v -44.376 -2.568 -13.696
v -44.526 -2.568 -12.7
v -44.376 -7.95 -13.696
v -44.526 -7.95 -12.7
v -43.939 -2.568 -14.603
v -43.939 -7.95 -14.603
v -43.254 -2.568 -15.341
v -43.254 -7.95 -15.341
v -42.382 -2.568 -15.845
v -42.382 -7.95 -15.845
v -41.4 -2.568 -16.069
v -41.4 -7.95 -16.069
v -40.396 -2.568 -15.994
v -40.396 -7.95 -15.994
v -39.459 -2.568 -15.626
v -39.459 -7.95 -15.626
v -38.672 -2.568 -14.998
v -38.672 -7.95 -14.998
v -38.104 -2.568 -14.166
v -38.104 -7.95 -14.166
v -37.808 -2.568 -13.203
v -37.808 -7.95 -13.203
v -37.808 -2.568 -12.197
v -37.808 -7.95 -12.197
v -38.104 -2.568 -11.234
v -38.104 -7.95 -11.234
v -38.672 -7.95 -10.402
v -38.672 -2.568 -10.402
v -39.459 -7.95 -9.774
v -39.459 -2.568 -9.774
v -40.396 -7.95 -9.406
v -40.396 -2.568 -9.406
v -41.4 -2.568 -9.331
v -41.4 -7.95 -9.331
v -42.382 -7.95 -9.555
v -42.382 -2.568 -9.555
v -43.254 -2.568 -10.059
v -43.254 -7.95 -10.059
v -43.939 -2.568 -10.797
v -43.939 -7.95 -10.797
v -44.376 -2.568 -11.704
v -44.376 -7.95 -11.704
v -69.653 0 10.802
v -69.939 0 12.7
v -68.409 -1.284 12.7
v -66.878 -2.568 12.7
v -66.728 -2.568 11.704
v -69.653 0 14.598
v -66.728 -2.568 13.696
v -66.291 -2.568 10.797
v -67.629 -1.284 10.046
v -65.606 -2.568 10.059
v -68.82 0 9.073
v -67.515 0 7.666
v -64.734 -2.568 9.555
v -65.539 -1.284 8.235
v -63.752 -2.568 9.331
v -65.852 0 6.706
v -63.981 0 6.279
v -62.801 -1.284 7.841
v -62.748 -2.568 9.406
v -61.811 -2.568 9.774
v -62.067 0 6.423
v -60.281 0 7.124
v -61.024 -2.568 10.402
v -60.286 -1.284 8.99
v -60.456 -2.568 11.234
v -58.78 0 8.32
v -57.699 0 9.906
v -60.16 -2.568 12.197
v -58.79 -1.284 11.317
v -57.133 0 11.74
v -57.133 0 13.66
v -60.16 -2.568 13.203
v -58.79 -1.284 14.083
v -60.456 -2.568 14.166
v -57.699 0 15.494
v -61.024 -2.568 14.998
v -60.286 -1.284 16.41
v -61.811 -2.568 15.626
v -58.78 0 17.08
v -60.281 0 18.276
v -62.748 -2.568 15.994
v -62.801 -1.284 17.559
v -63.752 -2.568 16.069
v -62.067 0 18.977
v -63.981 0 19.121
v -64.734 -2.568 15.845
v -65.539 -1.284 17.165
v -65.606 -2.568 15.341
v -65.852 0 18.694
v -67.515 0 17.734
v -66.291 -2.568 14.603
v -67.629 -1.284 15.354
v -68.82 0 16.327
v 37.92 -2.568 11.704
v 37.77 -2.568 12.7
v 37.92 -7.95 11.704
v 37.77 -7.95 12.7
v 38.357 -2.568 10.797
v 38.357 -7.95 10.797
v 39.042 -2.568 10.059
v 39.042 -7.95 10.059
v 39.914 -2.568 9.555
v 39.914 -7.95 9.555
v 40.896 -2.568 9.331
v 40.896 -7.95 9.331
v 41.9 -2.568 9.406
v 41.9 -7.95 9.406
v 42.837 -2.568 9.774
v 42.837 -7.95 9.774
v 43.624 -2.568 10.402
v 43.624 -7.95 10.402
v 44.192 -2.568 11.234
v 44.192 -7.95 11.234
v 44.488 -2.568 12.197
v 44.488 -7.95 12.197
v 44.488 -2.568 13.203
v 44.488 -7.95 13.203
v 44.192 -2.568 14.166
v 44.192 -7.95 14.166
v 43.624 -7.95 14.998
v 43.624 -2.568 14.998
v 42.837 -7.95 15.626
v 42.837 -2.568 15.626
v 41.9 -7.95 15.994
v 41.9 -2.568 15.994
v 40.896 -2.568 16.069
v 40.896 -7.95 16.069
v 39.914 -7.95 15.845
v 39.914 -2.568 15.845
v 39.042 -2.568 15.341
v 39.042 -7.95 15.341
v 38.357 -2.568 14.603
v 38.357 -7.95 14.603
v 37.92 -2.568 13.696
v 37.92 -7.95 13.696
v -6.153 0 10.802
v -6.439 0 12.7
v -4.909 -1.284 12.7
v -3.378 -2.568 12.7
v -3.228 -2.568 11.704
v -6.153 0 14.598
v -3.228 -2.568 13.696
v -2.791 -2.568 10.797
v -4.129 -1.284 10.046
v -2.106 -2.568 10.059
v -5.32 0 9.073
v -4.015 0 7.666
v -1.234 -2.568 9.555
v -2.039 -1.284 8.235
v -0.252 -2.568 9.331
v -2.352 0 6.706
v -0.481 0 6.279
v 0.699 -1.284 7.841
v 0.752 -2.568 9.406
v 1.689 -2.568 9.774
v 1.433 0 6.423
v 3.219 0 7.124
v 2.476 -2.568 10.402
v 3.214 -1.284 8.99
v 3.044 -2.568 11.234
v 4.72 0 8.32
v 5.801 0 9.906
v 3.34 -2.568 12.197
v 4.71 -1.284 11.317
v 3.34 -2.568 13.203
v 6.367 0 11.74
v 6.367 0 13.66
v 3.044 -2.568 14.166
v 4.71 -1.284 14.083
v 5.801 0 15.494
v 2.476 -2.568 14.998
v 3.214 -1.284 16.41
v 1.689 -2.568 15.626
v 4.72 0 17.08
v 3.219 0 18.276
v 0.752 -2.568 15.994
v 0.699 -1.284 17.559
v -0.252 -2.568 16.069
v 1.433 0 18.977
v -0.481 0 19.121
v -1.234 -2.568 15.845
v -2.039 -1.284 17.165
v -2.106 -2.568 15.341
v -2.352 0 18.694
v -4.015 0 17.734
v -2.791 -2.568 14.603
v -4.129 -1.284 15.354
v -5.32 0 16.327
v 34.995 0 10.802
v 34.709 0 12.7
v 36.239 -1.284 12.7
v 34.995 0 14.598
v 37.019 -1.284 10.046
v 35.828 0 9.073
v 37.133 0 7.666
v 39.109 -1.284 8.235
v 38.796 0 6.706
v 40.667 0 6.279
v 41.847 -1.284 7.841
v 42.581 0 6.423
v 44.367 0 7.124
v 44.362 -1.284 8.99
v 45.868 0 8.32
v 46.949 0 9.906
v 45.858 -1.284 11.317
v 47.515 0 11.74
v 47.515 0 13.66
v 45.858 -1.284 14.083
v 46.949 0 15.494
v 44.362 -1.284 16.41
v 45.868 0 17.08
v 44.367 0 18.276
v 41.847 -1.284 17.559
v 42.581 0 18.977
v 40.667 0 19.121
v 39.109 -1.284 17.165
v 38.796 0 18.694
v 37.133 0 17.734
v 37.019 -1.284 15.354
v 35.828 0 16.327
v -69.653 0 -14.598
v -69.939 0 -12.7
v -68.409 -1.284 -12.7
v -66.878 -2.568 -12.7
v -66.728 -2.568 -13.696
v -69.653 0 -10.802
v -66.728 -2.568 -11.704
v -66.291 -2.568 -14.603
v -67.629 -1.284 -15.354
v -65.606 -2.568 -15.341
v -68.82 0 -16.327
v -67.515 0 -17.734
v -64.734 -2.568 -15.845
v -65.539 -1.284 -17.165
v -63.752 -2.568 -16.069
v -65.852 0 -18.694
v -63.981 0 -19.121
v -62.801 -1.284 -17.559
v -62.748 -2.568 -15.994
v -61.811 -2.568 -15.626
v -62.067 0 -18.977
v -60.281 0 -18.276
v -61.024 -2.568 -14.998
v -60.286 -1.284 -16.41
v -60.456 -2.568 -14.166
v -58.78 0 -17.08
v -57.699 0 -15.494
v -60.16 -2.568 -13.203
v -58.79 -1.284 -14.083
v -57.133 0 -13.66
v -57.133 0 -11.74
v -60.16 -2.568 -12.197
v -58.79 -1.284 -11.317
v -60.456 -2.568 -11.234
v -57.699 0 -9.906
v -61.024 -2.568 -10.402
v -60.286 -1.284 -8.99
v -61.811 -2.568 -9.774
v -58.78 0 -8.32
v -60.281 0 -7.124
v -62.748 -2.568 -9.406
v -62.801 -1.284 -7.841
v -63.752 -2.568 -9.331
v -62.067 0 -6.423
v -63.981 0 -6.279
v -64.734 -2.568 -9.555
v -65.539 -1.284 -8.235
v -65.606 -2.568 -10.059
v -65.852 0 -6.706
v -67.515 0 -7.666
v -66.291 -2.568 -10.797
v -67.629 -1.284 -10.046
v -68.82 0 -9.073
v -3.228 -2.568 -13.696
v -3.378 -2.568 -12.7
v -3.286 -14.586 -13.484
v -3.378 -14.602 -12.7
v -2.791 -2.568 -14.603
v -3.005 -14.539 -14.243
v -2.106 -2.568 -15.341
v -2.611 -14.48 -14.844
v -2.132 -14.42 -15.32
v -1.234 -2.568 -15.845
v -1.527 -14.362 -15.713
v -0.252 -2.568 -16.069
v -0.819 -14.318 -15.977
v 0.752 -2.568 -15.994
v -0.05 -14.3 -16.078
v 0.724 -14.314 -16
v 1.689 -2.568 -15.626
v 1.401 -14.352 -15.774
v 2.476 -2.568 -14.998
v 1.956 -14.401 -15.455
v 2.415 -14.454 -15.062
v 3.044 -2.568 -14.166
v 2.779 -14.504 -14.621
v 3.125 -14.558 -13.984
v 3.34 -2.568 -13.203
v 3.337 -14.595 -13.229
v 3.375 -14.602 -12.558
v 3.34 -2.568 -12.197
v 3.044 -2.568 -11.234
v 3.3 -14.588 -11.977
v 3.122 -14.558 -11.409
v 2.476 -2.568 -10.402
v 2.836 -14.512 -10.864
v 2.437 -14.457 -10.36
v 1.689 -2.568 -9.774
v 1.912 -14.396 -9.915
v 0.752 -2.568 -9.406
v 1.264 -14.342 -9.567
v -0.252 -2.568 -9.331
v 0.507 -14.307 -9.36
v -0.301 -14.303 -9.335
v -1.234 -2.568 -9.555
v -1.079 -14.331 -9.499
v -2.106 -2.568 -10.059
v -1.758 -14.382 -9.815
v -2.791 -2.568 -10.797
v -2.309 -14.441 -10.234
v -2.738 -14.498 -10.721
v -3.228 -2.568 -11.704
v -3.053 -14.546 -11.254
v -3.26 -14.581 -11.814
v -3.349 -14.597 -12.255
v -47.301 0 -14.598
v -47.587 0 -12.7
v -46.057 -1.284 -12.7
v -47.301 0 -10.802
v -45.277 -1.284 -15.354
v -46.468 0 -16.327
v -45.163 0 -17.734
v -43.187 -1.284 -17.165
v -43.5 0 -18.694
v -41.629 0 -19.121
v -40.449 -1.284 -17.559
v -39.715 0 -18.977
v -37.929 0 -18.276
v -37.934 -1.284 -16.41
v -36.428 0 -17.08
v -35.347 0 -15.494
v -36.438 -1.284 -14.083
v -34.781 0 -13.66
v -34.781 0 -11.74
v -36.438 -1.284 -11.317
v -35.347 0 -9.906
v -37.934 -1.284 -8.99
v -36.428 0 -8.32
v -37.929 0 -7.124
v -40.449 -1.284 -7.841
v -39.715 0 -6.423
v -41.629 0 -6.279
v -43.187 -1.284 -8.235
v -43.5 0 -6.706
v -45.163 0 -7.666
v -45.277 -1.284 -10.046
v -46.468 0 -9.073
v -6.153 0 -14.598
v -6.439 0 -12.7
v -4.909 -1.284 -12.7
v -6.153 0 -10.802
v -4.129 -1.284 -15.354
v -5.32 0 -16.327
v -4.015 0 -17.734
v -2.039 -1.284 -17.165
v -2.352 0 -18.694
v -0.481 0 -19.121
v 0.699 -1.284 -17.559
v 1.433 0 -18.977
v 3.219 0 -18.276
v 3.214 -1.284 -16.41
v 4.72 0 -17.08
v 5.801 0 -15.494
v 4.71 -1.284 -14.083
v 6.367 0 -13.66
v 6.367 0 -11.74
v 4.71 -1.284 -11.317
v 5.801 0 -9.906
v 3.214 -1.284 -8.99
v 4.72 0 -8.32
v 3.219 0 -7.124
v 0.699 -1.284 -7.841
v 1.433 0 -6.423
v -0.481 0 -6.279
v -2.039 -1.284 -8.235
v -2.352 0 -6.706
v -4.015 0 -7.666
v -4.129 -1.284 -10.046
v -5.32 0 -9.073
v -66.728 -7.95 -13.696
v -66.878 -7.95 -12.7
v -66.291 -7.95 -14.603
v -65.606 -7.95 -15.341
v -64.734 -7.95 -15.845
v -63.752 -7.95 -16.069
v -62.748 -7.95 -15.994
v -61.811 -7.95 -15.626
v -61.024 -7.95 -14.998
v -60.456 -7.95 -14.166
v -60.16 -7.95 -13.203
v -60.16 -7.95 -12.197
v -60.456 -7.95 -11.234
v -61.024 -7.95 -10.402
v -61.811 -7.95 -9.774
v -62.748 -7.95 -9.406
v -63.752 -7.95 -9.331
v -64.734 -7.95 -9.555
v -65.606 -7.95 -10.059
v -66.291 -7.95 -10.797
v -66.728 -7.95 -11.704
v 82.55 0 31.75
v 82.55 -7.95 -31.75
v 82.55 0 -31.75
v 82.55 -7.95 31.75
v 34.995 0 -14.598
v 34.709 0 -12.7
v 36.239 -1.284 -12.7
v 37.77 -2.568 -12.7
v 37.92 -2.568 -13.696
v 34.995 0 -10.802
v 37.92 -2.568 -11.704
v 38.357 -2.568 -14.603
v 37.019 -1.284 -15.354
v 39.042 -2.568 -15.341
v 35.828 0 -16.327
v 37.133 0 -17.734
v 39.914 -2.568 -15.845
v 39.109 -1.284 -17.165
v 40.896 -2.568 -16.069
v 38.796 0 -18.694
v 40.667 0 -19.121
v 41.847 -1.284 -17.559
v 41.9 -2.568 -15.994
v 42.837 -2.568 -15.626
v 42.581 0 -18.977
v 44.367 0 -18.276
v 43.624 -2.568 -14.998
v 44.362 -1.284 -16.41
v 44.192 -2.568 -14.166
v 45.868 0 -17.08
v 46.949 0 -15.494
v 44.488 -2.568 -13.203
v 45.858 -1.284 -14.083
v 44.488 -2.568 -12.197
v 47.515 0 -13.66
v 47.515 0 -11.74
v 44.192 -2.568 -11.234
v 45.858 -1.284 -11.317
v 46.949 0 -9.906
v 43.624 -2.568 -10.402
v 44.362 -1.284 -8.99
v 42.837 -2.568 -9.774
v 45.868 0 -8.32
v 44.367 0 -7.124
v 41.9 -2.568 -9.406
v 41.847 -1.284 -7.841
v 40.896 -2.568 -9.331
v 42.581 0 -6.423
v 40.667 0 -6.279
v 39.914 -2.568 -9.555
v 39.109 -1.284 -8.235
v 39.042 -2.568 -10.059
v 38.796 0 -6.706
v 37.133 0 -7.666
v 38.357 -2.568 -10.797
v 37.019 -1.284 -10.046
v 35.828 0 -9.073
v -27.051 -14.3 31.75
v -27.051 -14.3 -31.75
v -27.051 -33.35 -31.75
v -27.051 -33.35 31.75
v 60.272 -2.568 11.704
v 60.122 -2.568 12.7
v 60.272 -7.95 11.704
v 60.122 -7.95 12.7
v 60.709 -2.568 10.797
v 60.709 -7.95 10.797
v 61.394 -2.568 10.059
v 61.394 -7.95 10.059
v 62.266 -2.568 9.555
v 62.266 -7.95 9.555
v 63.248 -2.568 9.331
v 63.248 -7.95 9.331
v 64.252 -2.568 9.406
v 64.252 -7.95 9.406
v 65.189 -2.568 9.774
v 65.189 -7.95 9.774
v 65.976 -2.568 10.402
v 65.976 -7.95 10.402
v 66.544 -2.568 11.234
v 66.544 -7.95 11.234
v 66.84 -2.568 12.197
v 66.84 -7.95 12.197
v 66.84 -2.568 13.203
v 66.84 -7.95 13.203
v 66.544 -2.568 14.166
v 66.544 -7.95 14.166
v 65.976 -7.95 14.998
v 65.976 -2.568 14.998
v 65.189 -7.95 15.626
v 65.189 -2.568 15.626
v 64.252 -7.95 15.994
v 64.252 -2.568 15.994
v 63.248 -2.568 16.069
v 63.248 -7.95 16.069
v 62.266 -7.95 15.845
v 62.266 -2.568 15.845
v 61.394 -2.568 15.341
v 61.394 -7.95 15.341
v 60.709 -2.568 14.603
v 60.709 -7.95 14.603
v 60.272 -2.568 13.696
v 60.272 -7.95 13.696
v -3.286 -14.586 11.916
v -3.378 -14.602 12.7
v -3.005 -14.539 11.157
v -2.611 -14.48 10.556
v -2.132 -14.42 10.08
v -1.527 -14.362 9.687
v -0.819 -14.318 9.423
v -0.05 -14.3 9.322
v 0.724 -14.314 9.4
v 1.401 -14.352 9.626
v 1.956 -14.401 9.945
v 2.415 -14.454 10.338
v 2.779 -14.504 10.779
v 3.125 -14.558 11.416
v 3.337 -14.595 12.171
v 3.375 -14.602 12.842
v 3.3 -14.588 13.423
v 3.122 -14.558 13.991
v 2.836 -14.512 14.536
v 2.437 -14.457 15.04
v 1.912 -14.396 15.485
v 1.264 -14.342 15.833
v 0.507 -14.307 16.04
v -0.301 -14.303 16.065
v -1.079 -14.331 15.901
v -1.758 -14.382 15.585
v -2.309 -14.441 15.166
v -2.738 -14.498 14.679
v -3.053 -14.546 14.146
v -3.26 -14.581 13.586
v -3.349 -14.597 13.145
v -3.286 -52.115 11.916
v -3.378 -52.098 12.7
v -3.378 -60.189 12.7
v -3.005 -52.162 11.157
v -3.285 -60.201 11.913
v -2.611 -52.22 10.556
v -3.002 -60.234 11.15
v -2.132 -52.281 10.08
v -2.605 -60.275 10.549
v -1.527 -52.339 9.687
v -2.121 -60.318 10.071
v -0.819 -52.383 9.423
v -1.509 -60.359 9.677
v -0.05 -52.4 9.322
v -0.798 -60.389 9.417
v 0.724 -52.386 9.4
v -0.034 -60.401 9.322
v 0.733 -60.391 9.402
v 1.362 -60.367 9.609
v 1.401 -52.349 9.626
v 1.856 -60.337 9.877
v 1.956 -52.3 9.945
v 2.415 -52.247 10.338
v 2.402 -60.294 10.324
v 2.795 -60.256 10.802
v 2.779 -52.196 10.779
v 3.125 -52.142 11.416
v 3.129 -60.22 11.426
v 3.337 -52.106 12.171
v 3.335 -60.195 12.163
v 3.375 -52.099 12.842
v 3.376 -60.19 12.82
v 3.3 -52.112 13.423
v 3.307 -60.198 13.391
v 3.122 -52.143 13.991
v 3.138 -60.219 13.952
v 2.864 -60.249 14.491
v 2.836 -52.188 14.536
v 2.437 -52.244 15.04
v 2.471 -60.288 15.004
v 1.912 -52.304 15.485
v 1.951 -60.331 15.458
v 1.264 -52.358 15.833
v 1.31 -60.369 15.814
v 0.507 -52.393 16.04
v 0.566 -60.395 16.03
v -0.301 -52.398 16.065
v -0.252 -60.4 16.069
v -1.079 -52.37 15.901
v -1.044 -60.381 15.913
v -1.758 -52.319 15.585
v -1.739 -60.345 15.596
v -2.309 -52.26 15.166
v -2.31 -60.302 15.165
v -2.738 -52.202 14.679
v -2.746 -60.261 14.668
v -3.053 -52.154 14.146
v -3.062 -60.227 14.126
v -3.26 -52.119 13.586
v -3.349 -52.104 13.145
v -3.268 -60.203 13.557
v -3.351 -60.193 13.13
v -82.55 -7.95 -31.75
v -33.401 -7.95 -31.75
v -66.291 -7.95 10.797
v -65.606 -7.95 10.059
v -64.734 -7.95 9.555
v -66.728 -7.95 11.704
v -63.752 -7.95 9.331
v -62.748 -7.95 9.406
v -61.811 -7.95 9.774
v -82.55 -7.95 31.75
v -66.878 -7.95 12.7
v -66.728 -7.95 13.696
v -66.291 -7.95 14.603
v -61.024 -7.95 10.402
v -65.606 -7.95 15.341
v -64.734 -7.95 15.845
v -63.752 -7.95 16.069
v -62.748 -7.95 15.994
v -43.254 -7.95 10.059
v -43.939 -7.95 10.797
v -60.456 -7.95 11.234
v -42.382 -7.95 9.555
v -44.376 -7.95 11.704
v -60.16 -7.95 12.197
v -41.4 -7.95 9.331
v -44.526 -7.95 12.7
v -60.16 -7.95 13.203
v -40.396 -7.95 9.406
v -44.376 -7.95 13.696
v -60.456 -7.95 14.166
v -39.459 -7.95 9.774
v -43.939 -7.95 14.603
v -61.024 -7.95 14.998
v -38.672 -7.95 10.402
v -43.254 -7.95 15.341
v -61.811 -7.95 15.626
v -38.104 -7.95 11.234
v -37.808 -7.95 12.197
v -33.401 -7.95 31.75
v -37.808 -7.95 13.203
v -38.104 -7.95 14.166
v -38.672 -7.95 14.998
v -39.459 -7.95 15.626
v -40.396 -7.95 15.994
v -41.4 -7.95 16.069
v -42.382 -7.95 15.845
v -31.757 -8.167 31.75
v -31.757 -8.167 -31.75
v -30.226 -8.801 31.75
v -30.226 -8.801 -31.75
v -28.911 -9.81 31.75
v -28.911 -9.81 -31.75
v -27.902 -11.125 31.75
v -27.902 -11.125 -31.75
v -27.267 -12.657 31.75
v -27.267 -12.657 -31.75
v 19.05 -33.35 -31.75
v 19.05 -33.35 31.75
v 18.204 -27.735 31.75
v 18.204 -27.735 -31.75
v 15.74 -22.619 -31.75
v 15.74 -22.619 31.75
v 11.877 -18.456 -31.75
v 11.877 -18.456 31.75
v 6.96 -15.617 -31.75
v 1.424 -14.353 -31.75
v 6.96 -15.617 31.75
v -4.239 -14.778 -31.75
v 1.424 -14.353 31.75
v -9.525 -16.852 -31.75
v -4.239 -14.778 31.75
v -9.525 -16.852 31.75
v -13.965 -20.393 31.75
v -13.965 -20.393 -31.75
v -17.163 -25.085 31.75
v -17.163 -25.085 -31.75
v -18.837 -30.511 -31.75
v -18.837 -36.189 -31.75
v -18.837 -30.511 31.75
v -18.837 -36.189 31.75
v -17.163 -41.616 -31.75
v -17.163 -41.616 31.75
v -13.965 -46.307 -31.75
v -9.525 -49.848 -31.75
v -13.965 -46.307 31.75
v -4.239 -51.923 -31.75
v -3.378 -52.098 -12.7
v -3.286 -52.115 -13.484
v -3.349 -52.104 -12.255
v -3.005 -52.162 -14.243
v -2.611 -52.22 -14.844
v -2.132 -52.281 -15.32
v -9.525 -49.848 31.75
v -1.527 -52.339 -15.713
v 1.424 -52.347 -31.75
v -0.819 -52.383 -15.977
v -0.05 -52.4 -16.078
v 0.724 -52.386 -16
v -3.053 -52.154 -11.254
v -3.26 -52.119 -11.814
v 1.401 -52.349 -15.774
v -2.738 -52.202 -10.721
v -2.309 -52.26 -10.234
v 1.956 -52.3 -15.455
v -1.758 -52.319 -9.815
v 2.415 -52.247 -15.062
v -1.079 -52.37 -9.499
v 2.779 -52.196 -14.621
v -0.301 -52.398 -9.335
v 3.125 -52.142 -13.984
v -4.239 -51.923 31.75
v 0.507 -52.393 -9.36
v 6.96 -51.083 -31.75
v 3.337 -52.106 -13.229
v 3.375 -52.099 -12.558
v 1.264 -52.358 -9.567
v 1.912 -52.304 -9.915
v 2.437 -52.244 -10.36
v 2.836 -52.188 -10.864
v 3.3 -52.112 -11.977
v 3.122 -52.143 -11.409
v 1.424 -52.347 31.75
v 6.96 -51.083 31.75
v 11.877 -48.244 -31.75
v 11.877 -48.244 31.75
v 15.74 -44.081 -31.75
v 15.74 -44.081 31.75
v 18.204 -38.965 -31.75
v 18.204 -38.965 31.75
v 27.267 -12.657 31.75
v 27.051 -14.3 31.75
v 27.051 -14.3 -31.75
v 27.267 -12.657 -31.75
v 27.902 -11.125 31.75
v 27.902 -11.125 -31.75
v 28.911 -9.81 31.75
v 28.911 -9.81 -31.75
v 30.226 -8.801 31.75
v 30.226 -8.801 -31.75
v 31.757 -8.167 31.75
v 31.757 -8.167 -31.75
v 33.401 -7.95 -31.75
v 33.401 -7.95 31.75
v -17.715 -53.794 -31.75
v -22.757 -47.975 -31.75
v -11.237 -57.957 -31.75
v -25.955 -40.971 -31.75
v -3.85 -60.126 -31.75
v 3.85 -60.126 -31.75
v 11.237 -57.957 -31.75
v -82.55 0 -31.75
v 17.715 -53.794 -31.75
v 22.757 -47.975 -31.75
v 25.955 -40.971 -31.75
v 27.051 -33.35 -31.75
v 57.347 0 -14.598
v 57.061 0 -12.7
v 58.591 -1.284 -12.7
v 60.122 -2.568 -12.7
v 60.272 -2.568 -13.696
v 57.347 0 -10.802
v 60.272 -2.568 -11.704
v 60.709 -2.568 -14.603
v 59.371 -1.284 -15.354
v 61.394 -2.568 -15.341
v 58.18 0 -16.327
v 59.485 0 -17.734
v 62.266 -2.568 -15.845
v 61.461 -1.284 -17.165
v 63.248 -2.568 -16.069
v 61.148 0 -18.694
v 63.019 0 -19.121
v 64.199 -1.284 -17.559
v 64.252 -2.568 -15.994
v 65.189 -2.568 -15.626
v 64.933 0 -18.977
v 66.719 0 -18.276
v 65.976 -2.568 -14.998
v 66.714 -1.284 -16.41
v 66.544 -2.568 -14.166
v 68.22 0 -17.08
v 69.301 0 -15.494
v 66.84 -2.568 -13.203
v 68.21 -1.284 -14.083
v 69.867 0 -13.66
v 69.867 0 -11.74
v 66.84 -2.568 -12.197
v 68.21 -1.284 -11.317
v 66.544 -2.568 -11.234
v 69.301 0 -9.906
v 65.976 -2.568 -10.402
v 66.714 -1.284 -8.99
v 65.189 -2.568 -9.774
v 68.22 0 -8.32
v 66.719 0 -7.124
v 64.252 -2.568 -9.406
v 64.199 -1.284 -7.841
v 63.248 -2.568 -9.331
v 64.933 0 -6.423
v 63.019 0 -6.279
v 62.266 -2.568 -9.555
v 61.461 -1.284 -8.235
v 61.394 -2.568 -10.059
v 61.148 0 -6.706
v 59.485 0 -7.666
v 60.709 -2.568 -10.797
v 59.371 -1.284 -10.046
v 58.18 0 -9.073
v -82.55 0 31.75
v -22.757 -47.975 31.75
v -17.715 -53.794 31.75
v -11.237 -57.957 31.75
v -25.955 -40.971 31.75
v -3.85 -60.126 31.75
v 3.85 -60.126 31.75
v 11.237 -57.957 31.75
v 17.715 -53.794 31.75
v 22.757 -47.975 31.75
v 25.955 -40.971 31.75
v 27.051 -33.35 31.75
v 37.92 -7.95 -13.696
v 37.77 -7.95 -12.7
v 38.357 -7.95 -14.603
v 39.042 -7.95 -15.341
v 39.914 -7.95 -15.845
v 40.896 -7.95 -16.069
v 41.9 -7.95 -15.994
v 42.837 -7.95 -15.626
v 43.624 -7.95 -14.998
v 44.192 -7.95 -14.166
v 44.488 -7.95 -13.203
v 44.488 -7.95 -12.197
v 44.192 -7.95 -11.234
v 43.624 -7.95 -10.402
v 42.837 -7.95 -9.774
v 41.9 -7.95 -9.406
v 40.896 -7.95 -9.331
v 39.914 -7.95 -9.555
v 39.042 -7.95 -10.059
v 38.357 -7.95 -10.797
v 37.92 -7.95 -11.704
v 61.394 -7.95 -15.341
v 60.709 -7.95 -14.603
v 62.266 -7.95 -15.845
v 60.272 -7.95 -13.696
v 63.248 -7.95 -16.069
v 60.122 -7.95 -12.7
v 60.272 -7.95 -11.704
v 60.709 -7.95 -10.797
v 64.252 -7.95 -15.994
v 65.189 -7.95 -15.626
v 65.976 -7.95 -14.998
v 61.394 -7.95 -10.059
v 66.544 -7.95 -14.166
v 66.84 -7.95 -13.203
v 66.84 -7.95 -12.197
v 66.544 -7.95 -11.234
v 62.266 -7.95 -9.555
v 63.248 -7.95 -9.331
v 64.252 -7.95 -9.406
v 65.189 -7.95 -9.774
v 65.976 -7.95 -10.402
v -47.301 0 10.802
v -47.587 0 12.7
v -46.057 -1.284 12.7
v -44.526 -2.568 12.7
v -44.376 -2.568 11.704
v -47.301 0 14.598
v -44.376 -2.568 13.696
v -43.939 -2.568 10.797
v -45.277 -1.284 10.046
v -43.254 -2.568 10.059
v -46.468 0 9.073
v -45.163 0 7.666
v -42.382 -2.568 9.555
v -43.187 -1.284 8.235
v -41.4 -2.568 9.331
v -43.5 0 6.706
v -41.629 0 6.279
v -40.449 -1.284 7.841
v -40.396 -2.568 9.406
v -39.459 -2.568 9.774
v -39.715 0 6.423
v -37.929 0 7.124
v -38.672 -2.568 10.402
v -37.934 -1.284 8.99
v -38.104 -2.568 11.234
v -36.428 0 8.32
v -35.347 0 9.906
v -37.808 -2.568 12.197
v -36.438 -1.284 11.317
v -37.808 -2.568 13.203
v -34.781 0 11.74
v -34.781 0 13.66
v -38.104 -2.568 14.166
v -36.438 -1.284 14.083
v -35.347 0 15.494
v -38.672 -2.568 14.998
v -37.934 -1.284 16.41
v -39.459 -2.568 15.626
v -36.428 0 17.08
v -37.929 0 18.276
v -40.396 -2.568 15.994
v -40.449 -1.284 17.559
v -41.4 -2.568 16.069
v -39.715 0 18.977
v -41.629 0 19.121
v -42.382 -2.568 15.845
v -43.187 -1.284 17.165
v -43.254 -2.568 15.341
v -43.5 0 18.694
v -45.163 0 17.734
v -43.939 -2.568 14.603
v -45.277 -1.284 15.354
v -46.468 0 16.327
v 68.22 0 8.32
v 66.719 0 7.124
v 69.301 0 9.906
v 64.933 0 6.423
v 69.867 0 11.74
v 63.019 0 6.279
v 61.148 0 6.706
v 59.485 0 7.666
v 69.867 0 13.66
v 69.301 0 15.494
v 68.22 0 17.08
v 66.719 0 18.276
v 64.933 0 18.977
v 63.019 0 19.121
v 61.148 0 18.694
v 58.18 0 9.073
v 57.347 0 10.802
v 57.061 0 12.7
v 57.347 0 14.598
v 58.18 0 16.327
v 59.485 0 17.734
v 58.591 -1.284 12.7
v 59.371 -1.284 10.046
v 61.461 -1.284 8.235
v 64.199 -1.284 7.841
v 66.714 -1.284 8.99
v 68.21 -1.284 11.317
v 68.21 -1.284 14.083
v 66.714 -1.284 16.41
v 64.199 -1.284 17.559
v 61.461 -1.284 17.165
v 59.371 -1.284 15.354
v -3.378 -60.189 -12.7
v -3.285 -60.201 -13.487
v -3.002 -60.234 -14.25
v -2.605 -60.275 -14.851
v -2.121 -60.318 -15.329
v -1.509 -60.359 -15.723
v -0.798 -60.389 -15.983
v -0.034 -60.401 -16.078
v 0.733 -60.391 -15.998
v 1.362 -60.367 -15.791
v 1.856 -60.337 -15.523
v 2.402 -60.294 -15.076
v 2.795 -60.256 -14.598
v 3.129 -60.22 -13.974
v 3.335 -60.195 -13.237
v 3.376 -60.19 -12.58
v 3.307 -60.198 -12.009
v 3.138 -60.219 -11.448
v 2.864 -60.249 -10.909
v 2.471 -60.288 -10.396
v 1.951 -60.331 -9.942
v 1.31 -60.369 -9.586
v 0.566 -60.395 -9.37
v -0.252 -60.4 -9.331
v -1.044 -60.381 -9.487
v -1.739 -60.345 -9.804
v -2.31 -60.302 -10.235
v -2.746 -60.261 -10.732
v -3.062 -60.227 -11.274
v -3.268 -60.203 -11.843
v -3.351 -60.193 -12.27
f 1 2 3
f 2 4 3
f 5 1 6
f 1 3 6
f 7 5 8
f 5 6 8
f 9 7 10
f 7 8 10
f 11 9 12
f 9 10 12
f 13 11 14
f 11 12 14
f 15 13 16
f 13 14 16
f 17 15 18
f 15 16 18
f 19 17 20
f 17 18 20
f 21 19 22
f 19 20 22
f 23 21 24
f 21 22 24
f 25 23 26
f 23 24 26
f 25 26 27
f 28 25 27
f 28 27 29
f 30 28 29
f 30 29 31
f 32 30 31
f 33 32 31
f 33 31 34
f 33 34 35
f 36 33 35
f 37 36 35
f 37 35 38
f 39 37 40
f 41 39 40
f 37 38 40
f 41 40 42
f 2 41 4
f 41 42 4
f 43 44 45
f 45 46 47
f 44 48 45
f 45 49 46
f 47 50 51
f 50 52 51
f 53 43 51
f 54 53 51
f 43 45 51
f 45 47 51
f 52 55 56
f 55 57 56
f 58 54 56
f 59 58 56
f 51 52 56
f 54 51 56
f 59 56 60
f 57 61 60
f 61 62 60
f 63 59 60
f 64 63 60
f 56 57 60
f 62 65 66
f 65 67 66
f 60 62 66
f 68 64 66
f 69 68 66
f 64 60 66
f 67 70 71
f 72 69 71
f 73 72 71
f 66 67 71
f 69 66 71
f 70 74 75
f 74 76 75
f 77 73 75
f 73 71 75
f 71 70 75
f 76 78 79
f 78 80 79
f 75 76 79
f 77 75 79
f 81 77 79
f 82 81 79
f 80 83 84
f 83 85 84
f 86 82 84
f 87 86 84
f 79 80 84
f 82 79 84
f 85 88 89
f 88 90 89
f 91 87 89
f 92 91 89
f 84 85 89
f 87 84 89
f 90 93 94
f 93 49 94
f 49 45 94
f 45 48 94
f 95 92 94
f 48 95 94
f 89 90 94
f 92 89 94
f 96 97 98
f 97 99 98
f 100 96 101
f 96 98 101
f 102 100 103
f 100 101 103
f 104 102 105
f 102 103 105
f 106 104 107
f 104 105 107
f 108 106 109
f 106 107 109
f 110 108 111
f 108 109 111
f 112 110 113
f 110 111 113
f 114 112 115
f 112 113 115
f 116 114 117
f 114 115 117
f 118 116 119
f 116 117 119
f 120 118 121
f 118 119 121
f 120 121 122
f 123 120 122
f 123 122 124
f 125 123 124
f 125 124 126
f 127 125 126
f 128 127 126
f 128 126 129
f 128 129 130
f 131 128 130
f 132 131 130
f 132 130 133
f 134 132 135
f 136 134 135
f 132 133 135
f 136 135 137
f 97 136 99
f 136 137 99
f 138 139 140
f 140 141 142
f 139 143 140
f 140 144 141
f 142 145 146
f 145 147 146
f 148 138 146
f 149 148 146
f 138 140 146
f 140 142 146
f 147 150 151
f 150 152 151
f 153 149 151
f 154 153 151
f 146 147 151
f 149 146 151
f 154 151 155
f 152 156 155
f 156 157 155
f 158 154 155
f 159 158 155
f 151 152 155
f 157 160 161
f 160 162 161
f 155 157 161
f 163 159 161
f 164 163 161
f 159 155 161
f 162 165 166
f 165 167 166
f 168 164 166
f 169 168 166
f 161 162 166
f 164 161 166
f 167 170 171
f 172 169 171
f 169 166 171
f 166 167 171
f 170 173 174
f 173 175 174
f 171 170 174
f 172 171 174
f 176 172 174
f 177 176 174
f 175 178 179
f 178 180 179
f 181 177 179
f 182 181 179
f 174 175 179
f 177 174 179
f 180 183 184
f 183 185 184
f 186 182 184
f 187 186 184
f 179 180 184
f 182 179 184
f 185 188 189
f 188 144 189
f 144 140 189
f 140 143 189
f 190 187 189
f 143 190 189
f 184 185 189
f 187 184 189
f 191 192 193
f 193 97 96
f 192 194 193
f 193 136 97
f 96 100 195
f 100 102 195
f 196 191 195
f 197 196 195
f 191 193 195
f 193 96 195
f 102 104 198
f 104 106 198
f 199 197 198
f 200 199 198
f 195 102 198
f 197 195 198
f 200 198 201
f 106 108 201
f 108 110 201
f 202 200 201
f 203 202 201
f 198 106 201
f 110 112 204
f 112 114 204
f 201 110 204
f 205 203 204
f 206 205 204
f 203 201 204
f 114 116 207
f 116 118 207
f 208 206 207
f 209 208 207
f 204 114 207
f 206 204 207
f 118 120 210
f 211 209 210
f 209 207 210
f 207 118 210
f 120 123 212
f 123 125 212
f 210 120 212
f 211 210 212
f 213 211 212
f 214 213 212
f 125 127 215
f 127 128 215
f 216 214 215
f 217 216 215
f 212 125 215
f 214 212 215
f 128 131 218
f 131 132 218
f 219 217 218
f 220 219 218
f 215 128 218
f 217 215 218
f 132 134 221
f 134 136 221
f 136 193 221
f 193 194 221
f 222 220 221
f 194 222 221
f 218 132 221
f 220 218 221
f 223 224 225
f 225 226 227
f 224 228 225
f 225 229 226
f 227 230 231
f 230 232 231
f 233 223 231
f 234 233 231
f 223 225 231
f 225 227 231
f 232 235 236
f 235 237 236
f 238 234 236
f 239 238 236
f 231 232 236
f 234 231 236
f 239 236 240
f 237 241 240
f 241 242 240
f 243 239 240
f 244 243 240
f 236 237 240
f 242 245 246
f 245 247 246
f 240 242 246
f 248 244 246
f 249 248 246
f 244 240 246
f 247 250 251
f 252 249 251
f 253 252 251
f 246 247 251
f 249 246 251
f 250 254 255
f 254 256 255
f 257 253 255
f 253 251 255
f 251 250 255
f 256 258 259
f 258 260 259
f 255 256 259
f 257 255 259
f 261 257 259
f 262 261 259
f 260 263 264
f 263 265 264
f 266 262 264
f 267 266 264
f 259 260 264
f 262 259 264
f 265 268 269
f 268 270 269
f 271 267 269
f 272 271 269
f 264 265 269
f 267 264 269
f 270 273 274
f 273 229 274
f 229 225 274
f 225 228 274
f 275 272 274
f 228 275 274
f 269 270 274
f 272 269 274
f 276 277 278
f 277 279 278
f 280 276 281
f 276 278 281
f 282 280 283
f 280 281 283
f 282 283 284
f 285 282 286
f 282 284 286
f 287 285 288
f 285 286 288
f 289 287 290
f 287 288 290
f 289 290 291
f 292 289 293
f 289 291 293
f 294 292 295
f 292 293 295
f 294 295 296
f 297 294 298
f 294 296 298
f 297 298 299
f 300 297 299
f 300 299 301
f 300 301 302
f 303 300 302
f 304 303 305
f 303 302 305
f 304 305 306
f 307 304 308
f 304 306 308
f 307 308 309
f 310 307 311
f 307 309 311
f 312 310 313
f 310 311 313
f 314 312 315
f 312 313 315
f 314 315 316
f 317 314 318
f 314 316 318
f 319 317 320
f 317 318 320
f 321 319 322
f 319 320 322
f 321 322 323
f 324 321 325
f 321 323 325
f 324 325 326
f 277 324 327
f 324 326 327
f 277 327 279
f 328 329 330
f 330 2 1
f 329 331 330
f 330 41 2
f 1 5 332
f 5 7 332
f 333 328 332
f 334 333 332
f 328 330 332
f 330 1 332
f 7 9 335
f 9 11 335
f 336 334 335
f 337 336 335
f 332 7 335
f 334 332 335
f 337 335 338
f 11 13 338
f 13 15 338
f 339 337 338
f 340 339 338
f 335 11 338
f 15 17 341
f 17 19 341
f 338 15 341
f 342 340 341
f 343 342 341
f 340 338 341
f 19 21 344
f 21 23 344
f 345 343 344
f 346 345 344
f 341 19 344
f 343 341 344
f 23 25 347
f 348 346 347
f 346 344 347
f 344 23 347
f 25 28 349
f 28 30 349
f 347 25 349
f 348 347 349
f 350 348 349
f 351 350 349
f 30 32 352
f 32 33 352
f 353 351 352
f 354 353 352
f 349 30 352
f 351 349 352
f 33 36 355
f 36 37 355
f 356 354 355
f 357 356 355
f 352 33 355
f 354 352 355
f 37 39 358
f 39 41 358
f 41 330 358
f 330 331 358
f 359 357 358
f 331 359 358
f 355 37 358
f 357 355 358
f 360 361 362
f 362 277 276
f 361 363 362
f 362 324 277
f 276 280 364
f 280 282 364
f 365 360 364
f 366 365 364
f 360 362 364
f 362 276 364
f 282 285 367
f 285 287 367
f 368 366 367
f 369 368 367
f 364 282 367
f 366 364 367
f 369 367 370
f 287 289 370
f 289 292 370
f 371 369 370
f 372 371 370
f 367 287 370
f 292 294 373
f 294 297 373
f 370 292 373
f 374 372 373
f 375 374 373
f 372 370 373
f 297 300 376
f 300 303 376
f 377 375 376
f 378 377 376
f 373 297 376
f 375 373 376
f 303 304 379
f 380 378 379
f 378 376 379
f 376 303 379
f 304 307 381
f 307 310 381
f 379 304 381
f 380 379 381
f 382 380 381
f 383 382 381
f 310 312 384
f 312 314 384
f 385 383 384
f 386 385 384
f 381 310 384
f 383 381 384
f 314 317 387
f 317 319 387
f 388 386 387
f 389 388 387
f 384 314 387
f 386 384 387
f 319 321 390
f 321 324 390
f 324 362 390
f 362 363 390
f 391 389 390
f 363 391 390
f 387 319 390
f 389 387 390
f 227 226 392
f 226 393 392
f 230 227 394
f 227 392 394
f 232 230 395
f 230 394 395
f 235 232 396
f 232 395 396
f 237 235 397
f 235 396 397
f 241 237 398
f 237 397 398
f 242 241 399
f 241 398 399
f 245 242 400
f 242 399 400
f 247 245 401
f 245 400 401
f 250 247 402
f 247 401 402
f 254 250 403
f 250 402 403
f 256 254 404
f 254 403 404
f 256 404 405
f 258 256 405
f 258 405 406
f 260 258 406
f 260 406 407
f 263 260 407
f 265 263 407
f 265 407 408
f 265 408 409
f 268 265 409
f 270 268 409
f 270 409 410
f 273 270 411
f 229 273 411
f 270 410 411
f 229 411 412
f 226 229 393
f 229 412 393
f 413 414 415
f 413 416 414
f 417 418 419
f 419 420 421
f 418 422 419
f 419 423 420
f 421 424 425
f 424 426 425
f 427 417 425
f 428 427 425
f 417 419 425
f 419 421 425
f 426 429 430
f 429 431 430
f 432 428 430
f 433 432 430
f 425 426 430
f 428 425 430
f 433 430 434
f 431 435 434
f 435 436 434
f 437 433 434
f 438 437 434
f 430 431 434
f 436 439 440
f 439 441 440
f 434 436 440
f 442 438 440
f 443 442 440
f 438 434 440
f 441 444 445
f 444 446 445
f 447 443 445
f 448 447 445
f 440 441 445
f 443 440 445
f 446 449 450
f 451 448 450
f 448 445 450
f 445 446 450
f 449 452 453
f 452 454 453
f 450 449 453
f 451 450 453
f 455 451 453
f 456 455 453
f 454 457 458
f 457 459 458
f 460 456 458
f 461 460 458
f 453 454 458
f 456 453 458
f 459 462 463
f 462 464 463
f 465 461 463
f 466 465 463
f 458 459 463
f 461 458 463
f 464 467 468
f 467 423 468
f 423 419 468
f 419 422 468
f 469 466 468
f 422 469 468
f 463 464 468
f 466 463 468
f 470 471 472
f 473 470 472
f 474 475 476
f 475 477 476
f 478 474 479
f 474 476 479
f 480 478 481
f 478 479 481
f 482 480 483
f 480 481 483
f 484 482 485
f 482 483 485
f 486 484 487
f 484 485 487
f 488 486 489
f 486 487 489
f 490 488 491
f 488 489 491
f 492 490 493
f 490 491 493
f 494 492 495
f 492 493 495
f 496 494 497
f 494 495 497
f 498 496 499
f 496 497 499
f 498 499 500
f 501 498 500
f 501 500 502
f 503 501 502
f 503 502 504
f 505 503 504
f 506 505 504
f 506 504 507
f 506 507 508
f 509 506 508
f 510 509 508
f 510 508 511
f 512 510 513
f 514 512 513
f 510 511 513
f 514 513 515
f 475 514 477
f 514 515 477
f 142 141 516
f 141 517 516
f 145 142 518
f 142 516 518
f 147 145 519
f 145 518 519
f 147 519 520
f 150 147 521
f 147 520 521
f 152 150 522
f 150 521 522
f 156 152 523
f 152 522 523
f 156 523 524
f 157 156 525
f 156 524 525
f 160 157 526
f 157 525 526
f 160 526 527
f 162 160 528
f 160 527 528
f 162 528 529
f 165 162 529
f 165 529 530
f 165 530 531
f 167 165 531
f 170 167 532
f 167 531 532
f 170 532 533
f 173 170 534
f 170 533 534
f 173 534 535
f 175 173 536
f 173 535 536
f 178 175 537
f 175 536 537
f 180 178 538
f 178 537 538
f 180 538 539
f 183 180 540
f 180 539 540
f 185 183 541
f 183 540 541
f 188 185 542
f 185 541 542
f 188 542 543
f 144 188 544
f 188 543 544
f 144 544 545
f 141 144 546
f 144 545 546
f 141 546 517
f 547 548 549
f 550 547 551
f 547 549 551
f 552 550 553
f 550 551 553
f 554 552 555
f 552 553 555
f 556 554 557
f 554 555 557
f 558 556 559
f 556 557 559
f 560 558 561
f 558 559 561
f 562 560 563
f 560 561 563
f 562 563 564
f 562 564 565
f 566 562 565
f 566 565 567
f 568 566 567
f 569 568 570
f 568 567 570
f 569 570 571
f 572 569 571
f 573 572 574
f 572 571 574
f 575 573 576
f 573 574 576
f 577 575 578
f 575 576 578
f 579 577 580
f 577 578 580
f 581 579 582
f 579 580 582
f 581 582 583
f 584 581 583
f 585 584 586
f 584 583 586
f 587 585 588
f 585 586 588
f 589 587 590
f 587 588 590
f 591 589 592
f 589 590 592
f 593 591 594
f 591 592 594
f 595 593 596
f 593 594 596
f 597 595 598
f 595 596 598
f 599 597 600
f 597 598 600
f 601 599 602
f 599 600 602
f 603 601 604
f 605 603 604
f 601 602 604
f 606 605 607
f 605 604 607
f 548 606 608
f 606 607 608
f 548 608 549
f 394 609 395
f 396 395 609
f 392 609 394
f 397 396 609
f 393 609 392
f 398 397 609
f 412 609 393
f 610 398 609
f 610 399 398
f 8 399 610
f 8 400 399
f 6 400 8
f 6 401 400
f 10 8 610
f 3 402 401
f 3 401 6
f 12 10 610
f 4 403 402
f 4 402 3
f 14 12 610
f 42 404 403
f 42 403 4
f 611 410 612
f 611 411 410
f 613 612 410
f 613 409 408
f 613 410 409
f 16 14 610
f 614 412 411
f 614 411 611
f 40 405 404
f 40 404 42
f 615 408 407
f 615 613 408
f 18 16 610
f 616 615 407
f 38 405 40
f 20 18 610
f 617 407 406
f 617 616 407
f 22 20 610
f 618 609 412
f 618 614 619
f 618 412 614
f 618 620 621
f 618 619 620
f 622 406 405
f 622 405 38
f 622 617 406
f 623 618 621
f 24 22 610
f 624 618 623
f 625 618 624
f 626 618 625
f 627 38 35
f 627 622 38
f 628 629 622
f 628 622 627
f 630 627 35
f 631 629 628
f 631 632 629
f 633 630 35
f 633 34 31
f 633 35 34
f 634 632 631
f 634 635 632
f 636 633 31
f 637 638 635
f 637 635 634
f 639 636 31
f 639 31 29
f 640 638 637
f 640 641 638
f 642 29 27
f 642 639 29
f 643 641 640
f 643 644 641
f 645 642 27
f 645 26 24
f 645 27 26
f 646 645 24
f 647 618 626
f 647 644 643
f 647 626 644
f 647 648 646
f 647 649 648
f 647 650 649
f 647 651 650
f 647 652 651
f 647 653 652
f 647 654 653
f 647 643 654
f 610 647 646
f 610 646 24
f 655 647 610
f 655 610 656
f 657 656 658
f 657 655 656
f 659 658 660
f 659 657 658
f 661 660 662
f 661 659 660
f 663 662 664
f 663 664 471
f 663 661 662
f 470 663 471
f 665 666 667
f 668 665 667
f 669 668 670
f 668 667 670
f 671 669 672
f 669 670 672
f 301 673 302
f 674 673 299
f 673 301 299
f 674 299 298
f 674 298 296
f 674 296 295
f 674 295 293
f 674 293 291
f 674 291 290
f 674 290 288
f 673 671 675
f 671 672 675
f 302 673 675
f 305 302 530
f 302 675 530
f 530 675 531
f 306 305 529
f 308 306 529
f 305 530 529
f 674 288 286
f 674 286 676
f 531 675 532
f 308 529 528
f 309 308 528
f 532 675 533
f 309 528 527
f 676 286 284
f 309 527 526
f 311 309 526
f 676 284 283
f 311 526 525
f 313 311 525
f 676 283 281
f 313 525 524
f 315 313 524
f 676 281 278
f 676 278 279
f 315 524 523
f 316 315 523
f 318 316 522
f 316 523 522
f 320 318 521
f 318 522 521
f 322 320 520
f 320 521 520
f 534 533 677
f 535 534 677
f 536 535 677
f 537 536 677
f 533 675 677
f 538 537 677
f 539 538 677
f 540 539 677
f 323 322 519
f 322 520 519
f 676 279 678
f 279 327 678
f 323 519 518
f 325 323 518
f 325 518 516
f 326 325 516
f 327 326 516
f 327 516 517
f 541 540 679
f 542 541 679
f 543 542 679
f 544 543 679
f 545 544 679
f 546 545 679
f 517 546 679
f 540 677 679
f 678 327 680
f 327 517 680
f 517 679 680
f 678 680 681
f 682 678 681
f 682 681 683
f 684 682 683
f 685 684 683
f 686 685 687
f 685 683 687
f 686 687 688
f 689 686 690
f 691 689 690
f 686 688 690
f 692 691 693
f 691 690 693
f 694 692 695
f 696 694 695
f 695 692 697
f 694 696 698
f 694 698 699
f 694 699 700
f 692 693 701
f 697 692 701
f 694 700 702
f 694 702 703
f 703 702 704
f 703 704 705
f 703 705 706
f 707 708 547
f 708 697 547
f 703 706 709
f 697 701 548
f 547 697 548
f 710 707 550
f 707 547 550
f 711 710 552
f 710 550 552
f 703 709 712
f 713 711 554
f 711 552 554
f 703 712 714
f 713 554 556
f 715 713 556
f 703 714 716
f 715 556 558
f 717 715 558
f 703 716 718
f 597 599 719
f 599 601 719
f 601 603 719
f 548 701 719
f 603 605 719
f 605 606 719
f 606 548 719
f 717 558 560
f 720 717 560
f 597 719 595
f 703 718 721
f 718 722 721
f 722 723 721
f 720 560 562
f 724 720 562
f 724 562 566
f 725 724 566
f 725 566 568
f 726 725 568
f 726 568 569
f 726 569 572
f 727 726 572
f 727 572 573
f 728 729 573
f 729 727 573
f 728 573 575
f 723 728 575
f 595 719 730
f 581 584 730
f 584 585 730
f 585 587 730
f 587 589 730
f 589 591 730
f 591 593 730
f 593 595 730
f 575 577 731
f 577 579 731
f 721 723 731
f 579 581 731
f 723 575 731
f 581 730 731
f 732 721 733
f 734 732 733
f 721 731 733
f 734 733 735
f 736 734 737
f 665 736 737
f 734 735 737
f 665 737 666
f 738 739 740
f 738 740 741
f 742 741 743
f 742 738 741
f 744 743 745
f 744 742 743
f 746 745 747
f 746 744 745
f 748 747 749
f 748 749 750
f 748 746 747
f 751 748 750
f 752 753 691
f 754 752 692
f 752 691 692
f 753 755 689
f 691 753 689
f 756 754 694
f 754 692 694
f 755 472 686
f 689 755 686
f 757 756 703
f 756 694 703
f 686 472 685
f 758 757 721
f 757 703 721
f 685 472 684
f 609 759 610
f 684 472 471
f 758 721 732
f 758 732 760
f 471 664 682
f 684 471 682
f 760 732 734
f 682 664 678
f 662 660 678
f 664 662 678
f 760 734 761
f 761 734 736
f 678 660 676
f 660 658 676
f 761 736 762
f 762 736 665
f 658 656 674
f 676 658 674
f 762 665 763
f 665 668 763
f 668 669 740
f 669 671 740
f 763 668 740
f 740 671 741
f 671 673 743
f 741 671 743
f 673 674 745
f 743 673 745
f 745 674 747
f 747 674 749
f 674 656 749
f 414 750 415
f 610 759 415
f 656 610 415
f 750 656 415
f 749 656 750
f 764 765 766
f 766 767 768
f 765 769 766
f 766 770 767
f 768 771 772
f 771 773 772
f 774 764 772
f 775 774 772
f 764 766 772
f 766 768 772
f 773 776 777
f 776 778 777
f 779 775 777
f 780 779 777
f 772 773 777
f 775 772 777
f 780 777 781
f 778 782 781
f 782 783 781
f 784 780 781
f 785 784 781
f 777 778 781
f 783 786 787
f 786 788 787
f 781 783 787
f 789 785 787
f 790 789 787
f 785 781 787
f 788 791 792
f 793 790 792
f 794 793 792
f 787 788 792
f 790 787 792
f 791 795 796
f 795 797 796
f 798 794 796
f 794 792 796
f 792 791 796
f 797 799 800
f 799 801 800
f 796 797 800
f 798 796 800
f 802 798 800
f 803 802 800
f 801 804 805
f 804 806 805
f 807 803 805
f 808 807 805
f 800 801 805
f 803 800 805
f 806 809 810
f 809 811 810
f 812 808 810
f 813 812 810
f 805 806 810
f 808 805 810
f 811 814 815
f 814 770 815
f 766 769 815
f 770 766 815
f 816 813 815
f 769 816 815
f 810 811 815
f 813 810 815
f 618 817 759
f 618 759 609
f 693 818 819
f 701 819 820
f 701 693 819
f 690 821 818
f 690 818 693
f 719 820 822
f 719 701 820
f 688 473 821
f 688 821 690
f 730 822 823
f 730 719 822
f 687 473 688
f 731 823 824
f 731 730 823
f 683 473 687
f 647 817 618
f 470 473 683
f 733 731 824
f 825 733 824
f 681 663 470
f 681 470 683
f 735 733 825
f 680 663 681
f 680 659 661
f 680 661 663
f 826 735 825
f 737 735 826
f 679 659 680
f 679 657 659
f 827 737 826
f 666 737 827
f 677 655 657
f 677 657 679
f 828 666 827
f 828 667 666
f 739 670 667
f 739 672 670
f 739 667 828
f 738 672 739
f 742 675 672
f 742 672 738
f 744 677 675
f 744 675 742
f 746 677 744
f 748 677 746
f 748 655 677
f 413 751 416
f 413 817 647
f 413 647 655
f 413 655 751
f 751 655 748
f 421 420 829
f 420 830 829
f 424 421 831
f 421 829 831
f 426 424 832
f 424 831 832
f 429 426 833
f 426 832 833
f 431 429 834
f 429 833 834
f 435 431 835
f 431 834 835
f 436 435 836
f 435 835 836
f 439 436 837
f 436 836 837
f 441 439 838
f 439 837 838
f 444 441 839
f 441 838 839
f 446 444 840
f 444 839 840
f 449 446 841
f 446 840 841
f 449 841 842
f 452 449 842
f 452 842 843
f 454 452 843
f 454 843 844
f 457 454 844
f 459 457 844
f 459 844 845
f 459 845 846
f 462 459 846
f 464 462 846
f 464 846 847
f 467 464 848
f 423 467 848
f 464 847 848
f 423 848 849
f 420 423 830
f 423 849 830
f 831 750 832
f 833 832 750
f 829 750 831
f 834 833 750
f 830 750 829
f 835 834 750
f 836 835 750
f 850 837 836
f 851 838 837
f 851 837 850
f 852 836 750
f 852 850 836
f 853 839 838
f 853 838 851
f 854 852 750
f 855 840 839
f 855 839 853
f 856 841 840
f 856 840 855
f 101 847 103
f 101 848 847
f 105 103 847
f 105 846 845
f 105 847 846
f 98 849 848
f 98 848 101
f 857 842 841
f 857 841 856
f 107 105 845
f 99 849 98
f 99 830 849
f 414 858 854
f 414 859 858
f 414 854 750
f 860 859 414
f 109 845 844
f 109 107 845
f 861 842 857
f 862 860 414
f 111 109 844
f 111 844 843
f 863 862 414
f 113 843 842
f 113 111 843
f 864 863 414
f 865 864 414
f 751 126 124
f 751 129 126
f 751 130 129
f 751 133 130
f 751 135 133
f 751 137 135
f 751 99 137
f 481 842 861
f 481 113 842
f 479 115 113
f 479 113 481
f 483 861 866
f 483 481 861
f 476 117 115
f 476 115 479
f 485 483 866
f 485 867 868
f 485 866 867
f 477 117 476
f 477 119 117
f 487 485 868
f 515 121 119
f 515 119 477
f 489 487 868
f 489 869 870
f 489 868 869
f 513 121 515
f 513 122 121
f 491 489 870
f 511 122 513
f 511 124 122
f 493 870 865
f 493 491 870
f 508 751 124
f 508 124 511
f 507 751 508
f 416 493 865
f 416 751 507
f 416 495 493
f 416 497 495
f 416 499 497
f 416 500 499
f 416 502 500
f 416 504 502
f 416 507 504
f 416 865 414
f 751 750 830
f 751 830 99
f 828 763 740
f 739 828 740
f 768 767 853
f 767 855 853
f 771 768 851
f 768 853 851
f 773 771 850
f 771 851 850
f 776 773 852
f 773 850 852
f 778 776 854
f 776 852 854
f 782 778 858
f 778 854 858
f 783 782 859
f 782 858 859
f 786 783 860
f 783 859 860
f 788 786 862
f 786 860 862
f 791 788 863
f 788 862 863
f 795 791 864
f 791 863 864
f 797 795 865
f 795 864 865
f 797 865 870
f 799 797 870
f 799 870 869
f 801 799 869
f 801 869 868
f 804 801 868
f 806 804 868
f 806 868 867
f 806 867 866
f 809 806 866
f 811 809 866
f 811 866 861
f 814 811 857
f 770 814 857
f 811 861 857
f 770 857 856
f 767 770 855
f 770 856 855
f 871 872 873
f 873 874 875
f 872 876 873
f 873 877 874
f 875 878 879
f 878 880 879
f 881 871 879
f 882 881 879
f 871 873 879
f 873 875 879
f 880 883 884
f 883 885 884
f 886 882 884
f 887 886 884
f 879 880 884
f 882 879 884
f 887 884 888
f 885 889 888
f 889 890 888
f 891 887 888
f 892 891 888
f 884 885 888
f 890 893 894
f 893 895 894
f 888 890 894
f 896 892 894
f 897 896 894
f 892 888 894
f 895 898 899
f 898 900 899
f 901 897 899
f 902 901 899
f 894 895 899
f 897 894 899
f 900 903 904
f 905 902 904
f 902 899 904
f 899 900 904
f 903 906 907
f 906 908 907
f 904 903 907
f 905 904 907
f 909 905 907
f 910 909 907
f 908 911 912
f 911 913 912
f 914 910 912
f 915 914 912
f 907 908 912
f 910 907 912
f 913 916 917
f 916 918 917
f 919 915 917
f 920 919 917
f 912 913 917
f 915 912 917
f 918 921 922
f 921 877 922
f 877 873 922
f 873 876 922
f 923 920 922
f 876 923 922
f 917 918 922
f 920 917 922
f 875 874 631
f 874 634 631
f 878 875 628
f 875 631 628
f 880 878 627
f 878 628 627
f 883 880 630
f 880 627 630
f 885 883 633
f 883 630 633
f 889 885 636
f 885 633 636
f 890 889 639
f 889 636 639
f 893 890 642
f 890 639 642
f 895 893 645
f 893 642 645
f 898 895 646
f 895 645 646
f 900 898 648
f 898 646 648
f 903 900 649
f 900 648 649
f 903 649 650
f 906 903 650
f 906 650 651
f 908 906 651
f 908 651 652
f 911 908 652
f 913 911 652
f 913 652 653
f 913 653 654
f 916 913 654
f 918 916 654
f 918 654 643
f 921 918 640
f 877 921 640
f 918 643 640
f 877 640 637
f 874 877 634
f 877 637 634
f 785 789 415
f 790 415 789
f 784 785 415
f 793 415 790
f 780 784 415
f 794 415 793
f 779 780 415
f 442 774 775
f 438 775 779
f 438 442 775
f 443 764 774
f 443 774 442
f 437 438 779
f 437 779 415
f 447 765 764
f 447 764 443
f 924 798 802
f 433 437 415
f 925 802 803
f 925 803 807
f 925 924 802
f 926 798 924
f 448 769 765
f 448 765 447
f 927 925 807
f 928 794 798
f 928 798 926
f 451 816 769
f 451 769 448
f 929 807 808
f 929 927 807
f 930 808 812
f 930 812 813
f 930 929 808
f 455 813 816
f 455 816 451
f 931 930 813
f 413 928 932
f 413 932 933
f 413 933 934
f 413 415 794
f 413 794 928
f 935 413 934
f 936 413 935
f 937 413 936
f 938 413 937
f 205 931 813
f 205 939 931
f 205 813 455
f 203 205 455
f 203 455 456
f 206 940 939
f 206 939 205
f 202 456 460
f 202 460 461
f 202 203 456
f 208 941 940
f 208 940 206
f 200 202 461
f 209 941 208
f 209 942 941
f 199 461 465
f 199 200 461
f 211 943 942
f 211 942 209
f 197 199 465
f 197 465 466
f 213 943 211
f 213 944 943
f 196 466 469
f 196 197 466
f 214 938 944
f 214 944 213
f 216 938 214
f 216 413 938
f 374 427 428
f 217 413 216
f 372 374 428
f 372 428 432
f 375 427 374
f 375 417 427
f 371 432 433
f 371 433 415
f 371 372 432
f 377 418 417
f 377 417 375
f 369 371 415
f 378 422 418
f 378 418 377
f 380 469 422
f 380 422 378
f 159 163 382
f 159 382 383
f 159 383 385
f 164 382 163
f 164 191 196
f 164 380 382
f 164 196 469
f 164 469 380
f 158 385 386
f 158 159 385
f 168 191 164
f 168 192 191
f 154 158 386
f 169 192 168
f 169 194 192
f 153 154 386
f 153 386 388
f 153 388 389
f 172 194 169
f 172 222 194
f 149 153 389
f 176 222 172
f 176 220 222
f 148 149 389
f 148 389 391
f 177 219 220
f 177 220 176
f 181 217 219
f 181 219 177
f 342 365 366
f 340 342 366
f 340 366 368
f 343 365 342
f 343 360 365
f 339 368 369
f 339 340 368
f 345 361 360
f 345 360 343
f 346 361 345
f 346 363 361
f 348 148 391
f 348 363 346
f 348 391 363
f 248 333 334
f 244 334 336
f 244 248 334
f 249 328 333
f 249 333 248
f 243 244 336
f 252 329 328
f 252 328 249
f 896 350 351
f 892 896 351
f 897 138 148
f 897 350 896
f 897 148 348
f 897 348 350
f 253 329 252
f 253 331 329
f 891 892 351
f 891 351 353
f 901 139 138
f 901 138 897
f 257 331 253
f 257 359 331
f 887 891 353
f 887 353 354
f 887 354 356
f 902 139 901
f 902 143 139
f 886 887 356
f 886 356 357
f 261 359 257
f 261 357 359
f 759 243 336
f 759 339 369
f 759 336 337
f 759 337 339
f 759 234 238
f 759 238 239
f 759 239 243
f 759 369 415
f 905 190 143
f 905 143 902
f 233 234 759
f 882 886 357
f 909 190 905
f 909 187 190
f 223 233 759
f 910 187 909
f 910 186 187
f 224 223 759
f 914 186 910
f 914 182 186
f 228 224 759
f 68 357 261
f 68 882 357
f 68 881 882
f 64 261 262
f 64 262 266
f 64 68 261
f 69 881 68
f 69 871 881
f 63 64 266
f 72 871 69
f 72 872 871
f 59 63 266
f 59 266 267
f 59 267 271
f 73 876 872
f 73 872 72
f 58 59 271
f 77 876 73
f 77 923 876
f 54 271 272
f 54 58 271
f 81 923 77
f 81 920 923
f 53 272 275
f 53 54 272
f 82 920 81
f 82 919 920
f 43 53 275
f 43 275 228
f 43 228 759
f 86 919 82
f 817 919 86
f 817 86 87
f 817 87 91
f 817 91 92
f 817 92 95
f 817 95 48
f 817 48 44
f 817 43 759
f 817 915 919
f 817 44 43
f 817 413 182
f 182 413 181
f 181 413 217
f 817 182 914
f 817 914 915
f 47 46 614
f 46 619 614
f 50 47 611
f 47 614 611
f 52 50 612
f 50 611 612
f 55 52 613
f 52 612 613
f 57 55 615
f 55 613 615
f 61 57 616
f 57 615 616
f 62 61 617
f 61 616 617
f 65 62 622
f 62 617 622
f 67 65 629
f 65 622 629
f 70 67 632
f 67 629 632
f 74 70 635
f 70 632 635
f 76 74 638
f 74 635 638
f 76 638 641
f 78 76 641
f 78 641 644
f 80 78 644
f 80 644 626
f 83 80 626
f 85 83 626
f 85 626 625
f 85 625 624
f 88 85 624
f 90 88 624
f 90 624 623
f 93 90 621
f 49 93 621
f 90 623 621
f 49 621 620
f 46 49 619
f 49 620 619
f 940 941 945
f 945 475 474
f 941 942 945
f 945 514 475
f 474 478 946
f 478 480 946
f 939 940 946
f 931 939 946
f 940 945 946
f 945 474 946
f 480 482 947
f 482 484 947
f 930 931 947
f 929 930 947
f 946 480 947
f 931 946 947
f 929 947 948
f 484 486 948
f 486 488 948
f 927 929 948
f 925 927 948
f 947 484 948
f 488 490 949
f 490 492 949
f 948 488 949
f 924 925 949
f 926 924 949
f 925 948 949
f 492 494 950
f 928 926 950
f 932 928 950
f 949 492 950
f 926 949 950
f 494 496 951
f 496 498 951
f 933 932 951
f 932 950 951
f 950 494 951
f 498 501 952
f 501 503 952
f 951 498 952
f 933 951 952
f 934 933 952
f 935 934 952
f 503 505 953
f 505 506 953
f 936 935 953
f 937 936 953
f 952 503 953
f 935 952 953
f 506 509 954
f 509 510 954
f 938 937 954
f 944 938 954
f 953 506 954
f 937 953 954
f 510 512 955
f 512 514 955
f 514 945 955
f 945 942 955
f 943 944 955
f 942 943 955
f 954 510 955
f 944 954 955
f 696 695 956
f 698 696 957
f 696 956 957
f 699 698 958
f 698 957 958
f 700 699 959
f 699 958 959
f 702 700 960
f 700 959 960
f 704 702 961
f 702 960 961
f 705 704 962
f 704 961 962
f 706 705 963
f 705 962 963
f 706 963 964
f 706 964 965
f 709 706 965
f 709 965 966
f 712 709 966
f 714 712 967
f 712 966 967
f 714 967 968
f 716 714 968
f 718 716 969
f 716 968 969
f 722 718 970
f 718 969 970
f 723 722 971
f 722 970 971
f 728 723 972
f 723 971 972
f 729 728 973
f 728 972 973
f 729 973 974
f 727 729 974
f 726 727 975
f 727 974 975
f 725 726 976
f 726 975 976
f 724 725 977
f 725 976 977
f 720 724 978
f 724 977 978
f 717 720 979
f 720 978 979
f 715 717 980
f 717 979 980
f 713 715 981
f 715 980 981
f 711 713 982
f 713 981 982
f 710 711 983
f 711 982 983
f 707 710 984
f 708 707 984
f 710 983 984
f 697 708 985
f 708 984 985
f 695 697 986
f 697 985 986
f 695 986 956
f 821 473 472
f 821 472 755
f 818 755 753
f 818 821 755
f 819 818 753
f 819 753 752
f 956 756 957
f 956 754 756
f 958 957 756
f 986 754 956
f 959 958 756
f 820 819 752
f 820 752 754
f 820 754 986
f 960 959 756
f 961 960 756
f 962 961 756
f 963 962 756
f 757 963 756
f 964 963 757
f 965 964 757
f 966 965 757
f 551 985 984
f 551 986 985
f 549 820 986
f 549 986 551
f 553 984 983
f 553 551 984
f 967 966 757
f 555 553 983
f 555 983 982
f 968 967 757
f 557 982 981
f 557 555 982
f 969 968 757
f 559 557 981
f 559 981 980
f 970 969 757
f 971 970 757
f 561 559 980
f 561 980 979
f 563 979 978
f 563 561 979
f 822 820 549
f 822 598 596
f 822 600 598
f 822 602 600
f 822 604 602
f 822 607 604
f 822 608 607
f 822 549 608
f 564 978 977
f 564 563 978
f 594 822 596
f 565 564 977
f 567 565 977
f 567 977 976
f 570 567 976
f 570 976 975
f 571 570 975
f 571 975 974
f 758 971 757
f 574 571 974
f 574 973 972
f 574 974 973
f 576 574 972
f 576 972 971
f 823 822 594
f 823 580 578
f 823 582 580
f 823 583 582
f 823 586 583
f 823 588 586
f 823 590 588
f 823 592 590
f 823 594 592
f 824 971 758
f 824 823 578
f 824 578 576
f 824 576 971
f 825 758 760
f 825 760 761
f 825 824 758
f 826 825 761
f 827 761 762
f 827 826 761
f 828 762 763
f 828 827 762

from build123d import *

# Parameters (mm, degrees)
BOSS_EXTRUDE1_DEPTH                                 = 31.75
SKETCH3_R                                           = 19.05
CUT_EXTRUDE1_DEPTH                                  = 64.5
CSK_FOR_1_4_FLAT_HEAD_MACHINE_SCREW_100_D           = 6.7564
CSK_FOR_1_4_FLAT_HEAD_MACHINE_SCREW_100_CSINK_D     = 12.8778
CSK_FOR_1_4_FLAT_HEAD_MACHINE_SCREW_100_CSINK_ANGLE = 100


with BuildPart() as part:
    # Sketch2 → Boss-Extrude1 (new body, symmetric)
    with BuildSketch(Plane.XY):
        with BuildLine():
            Line((82.55, 0), (-82.55, 0))
            Line((-82.55, 0), (-82.55, -7.9502))
            Line((-82.55, -7.9502), (-33.401, -7.9502))
            ThreePointArc((-33.401, -7.9502), (-28.910871939, -9.810071939), (-27.051, -14.3002))
            Line((-27.051, -14.3002), (-27.051, -33.3502))
            ThreePointArc((-27.051, -33.3502), (0, -60.4012), (27.051, -33.3502))
            Line((27.051, -33.3502), (27.051, -14.3002))
            ThreePointArc((27.051, -14.3002), (28.910871939, -9.810071939), (33.401, -7.9502))
            Line((33.401, -7.9502), (82.55, -7.9502))
            Line((82.55, -7.9502), (82.55, 0))
        make_face()
    extrude(amount=BOSS_EXTRUDE1_DEPTH, both=True)

    # Sketch3 → Cut-Extrude1 (cut, through all)
    with BuildSketch(Plane.XY.offset(31.75)):
        with Locations((0, -33.3502)):
            Circle(SKETCH3_R)
    extrude(amount=-CUT_EXTRUDE1_DEPTH, mode=Mode.SUBTRACT)

    # CSK for 1/4 Flat Head Machine Screw (100)2 (through all)
    with Locations(Plane(origin=(0, 0, 0), x_dir=(1, 0, 0), z_dir=(0, 1, 0))):
        with Locations((0, -12.7), (41.148, -12.7), (63.5, -12.7), (-41.148, -12.7), (-63.5, -12.7), (-41.148, 12.7), (-63.5, 12.7), (0, 12.7), (41.148, 12.7), (63.5, 12.7)):
            CounterSinkHole(CSK_FOR_1_4_FLAT_HEAD_MACHINE_SCREW_100_D / 2, CSK_FOR_1_4_FLAT_HEAD_MACHINE_SCREW_100_CSINK_D / 2, counter_sink_angle=CSK_FOR_1_4_FLAT_HEAD_MACHINE_SCREW_100_CSINK_ANGLE)


solid = part.part
